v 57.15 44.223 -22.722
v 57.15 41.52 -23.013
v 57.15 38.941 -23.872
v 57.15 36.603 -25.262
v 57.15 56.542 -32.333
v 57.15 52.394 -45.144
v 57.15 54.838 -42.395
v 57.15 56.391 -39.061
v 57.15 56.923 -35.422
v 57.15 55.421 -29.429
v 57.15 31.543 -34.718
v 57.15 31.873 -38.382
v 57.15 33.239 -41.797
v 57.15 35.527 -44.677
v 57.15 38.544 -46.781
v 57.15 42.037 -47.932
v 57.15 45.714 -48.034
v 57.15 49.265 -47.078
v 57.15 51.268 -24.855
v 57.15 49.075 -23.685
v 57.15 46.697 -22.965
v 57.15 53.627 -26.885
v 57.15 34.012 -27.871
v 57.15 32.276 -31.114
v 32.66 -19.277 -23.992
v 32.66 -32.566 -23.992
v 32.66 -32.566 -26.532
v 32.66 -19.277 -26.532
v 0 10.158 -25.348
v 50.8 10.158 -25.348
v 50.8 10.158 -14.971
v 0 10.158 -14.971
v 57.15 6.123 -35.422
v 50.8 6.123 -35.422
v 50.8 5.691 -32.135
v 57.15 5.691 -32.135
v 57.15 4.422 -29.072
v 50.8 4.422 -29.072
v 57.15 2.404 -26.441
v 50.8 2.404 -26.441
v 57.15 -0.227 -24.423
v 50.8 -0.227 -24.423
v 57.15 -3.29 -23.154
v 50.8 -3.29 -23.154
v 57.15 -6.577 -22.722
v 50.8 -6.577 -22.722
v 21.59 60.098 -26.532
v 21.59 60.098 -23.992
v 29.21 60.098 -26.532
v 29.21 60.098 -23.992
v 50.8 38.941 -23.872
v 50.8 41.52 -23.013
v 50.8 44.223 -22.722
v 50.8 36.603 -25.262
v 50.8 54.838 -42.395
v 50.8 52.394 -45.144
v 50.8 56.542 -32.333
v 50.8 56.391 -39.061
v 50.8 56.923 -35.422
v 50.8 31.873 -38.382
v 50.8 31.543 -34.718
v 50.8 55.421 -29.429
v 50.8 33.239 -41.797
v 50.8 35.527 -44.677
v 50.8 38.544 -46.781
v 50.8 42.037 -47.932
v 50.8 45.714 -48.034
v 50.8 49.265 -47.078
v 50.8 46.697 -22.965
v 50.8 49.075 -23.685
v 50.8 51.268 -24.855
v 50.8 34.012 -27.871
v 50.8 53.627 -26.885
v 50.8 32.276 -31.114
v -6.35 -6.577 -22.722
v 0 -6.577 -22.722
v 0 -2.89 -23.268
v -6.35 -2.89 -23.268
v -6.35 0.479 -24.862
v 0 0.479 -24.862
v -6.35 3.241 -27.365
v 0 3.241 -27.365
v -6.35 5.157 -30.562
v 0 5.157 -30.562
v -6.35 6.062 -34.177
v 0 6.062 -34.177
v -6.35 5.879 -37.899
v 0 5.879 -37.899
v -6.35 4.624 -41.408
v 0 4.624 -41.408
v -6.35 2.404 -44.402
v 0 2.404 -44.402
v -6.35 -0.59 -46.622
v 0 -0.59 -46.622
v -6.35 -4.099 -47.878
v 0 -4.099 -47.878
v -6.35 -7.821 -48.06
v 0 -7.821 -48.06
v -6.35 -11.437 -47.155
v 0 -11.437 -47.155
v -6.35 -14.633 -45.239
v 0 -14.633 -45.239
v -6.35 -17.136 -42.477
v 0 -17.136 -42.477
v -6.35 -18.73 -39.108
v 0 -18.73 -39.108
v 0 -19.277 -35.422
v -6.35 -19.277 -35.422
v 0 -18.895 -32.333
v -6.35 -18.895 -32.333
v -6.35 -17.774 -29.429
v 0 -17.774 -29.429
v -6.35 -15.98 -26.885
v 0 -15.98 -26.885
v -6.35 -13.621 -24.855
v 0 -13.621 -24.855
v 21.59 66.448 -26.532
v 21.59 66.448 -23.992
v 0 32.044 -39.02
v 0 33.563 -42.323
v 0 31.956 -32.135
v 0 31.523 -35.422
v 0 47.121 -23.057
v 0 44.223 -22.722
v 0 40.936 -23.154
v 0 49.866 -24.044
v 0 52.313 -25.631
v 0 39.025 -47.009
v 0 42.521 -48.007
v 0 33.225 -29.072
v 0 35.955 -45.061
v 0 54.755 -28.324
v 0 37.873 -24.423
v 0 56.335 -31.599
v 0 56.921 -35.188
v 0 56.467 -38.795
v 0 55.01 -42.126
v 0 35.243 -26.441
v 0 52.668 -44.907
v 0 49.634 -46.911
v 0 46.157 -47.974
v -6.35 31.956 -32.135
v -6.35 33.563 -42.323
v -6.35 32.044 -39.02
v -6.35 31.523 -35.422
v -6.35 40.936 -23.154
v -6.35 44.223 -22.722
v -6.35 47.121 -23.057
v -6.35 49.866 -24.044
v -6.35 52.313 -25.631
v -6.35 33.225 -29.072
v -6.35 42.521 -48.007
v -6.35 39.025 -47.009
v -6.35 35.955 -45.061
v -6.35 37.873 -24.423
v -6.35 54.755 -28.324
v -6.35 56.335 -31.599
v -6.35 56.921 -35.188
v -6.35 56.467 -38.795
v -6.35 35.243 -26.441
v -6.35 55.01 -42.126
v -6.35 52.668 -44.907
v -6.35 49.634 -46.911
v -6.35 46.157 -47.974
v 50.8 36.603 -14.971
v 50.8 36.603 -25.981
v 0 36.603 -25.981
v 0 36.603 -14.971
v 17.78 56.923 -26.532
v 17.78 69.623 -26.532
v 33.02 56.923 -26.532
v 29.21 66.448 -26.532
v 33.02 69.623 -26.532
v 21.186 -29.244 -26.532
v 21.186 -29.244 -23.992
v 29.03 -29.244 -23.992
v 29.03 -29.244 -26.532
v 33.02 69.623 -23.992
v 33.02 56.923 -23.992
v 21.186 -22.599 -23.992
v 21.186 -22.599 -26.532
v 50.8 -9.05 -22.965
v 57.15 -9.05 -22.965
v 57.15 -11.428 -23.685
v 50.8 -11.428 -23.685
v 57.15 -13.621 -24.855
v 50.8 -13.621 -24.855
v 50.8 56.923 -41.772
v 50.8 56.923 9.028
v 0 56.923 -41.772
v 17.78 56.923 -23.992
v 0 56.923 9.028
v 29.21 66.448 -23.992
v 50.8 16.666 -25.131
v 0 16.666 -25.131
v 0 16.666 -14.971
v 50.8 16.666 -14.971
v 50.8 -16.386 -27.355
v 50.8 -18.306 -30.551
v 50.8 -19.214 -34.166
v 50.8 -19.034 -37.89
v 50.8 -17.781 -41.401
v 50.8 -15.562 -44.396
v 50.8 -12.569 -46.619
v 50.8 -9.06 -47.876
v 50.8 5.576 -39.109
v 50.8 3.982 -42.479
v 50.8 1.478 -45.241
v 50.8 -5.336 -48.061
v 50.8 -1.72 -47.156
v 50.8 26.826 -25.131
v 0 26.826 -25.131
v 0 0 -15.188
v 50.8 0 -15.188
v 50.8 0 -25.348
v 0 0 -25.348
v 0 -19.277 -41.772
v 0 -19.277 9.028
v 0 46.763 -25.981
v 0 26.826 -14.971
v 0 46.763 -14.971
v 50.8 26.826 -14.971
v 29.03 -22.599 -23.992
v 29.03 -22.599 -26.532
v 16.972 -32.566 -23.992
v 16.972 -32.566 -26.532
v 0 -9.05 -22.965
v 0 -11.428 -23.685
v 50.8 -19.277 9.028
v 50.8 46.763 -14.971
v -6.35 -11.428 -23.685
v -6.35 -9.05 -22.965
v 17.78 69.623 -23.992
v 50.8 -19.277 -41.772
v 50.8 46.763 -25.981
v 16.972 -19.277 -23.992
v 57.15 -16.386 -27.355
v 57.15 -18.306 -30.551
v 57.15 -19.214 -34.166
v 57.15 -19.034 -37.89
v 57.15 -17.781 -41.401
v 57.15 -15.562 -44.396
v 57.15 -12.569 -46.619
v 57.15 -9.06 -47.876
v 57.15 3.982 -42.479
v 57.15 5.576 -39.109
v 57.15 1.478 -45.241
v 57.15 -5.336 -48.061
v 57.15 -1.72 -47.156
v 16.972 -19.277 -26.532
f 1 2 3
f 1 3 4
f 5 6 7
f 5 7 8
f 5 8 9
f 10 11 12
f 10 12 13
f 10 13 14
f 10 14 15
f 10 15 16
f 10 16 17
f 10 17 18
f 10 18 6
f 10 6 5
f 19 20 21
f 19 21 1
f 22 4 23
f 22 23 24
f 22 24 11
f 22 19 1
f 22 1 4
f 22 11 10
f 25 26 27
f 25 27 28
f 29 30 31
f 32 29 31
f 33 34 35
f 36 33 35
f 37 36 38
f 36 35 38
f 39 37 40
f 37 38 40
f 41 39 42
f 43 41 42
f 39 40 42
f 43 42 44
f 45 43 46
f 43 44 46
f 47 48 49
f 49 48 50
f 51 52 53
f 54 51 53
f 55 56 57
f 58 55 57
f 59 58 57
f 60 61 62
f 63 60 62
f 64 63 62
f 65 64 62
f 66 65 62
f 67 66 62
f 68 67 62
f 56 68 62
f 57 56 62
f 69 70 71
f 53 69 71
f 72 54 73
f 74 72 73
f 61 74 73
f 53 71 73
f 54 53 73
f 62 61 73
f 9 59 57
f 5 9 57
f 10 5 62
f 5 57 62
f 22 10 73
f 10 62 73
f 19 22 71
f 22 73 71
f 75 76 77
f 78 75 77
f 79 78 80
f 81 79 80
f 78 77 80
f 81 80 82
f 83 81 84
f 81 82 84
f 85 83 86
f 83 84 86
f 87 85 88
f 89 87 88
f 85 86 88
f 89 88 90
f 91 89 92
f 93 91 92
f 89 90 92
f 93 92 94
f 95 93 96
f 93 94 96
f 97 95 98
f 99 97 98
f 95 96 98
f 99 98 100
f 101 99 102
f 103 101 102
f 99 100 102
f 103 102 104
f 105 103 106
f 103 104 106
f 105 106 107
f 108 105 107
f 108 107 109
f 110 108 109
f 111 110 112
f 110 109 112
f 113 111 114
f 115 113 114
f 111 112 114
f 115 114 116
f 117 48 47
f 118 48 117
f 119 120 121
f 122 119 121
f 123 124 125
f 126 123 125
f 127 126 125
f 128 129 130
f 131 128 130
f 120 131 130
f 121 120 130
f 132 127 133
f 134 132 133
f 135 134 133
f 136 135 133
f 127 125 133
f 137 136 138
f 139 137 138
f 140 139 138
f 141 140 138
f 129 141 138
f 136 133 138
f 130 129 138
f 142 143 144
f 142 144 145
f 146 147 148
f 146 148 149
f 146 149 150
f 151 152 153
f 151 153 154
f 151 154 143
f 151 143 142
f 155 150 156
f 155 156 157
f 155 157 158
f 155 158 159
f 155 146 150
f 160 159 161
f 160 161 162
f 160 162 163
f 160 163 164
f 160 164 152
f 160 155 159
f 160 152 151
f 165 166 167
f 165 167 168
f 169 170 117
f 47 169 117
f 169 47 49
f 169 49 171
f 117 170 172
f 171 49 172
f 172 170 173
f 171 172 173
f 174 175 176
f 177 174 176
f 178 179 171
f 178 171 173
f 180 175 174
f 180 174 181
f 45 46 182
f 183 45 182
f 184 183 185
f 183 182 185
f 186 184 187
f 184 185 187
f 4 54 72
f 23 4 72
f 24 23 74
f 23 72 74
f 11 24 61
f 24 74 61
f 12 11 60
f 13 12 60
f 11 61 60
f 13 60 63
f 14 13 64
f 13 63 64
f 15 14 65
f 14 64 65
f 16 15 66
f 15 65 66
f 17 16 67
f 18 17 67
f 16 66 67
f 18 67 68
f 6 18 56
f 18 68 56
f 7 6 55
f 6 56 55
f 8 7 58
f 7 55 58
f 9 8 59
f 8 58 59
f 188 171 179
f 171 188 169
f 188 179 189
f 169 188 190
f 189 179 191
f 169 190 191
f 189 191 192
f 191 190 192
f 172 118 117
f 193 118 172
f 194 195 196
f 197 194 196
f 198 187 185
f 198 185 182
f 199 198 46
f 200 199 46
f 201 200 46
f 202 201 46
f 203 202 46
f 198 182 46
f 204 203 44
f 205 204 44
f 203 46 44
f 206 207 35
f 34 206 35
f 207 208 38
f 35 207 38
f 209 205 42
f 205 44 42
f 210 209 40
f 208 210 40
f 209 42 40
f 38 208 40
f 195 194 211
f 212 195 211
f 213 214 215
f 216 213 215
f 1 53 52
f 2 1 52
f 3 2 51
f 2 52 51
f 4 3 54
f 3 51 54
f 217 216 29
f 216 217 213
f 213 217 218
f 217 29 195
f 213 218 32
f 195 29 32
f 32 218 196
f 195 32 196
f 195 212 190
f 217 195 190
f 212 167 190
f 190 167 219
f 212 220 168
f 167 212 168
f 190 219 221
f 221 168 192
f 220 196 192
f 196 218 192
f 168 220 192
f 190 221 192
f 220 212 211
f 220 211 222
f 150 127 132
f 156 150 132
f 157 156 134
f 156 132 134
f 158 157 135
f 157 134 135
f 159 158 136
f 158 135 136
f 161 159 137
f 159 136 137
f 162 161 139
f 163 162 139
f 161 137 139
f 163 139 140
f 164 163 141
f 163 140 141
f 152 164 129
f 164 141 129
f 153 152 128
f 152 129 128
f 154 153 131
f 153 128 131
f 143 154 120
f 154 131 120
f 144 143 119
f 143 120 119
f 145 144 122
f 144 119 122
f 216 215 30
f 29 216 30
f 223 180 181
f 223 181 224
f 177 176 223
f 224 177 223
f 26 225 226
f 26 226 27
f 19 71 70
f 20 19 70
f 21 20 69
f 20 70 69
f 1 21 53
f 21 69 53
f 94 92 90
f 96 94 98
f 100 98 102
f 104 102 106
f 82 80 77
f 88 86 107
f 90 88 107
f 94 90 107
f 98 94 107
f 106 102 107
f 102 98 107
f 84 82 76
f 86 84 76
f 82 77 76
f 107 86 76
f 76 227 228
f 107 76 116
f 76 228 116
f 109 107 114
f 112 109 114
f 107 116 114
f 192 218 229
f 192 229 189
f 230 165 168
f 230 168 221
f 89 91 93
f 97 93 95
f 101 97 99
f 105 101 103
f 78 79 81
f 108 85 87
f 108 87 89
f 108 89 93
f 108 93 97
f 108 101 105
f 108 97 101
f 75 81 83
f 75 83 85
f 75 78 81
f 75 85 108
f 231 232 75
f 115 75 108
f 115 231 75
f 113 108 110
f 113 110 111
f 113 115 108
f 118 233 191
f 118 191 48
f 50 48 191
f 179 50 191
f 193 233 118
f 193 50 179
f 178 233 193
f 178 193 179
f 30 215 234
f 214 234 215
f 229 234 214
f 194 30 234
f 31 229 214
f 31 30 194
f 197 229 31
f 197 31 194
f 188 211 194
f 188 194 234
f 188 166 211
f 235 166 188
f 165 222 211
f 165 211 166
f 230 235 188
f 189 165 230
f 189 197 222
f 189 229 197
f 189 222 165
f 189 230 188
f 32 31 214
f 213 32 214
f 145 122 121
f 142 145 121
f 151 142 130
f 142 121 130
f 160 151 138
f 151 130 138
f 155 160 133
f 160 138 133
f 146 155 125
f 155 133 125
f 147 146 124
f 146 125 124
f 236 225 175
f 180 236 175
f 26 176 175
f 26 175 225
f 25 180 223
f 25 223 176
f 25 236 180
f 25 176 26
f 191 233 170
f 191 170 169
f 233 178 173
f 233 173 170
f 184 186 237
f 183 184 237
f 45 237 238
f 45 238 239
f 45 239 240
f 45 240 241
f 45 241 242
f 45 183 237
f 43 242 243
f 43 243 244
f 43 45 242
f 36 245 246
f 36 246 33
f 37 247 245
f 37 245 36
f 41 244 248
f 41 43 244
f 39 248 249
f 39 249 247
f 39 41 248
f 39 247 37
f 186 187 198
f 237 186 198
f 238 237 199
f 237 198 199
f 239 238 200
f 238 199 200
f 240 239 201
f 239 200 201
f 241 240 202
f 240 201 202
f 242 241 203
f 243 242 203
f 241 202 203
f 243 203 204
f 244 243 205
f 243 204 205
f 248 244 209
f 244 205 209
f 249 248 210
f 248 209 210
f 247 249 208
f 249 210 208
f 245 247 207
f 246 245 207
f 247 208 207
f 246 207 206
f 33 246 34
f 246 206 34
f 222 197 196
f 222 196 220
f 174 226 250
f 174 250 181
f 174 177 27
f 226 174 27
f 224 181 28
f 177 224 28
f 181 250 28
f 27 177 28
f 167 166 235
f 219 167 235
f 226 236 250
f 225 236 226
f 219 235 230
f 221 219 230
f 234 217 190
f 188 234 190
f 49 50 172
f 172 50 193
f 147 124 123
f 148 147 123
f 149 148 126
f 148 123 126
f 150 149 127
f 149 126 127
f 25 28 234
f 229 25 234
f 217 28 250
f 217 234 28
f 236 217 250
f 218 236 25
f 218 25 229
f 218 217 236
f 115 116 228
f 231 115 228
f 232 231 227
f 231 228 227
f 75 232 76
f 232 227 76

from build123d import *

# Parameters (mm, degrees)
F0_W      = 76.2
F0_H      = 50.8
F1_DEPTH  = 50.8
F2_W      = 10.16
F2_H      = 10.16
F2_H_2    = 11.009983
F3_DEPTH  = 50.8
F5_DEPTH  = 6.35
F7_DEPTH  = 6.35
F8_W      = 7.62
F8_H      = 6.35
F8_W_2    = 7.844116
F8_H_2    = 6.644809
F9_DEPTH  = 35.56
F10_DEPTH = 33.02


with BuildPart() as f1:
    # F0 (on Right) → F1 (new body)
    with BuildSketch(Plane.YZ):
        with Locations((18.823405, -16.371597)):
            Rectangle(F0_W, F0_H)
    extrude(amount=F1_DEPTH)

    # F2 (on face) → F3 (cut)
    with BuildSketch(Plane.YZ.offset(50.8)):
        Polygon((10.157681, -14.971033), (0, -15.188088), (0, -25.348088), (10.157681, -25.348088), align=None)
        with Locations((21.746397, -20.051033)):
            Rectangle(F2_W, F2_H)
        with Locations((41.683405, -20.476025)):
            Rectangle(F2_W, F2_H_2)
    extrude(amount=-F3_DEPTH, mode=Mode.SUBTRACT)

    # F8 (on face) → F9 (join)
    with BuildSketch(Plane.XY.offset(9.028403)):
        Polygon((17.78, 56.923405), (25.4, 56.923405), (33.02, 56.923405), (33.02, 69.623405), (17.78, 69.623405), (17.78, 63.273405), align=None)
        with Locations((25.4, 63.273405)):
            Rectangle(F8_W, F8_H, mode=Mode.SUBTRACT)
        Polygon((32.660052, -19.276595), (25.4, -19.276595), (16.971819, -19.276595), (16.971819, -32.566212), (32.660052, -32.566212), (32.660052, -25.921404), align=None)
        with Locations((25.107968, -25.921403)):
            Rectangle(F8_W_2, F8_H_2, mode=Mode.SUBTRACT)
    extrude(amount=-F9_DEPTH)

    # F8 (on face) → F10 (cut)
    with BuildSketch(Plane.XY.offset(9.028403)):
        Polygon((17.78, 56.923405), (25.4, 56.923405), (33.02, 56.923405), (33.02, 69.623405), (17.78, 69.623405), (17.78, 63.273405), align=None)
        with Locations((25.4, 63.273405)):
            Rectangle(F8_W, F8_H, mode=Mode.SUBTRACT)
        Polygon((32.660052, -19.276595), (25.4, -19.276595), (16.971819, -19.276595), (16.971819, -32.566212), (32.660052, -32.566212), (32.660052, -25.921404), align=None)
        with Locations((25.107968, -25.921403)):
            Rectangle(F8_W_2, F8_H_2, mode=Mode.SUBTRACT)
    extrude(amount=-F10_DEPTH, mode=Mode.SUBTRACT)


with BuildPart() as f5:
    # F4 (on face) → F5 (new body)
    with BuildSketch(Plane(origin=(0, 0, 0), x_dir=(0, -1, 0), z_dir=(-1, 0, 0))):
        with BuildLine():
            ThreePointArc((-52.312775, -25.631189), (-49.634273, -46.911266), (-31.523405, -35.421597))
            ThreePointArc((-31.523405, -35.421597), (-35.243149, -26.441341), (-44.223405, -22.721597))
            Line((-44.223405, -22.721597), (-44.223405, -35.421597))
            Line((-44.223405, -35.421597), (-52.312775, -25.631189))
        make_face()
        with BuildLine():
            Line((-44.223405, -35.421597), (-44.223405, -22.721597))
            ThreePointArc((-44.223405, -22.721597), (-48.521766, -23.471112), (-52.312775, -25.631189))
            Line((-52.312775, -25.631189), (-44.223405, -35.421597))
        make_face()
        with BuildLine():
            ThreePointArc((6.576595, -22.721597), (-2.403661, -44.401853), (19.276595, -35.421597))
            ThreePointArc((19.276595, -35.421597), (17.773863, -29.429001), (13.621288, -24.854558))
            Line((13.621288, -24.854558), (6.576595, -35.421597))
            Line((6.576595, -35.421597), (6.576595, -22.721597))
        make_face()
        with BuildLine():
            Line((6.576595, -35.421597), (13.621288, -24.854558))
            ThreePointArc((13.621288, -24.854558), (10.256854, -23.266528), (6.576595, -22.721597))
            Line((6.576595, -22.721597), (6.576595, -35.421597))
        make_face()
    extrude(amount=F5_DEPTH)


with BuildPart() as f7:
    # F6 (on face) → F7 (new body)
    with BuildSketch(Plane.YZ.offset(50.8)):
        with BuildLine():
            ThreePointArc((-13.621288, -24.854558), (-12.569191, -46.618864), (6.123405, -35.421597))
            ThreePointArc((6.123405, -35.421597), (2.403661, -26.441341), (-6.576595, -22.721597))
            Line((-6.576595, -22.721597), (-6.576595, -35.421597))
            Line((-6.576595, -35.421597), (-13.621288, -24.854558))
        make_face()
        with BuildLine():
            Line((-6.576595, -35.421597), (-6.576595, -22.721597))
            ThreePointArc((-6.576595, -22.721597), (-10.256854, -23.266528), (-13.621288, -24.854558))
            Line((-13.621288, -24.854558), (-6.576595, -35.421597))
        make_face()
        with BuildLine():
            ThreePointArc((44.223405, -22.721597), (40.207312, -23.373319), (36.603405, -25.261597))
            ThreePointArc((36.603405, -25.261597), (38.543792, -46.780822), (56.923405, -35.421597))
            ThreePointArc((56.923405, -35.421597), (55.420672, -29.429001), (51.268097, -24.854558))
            Line((51.268097, -24.854558), (44.223405, -35.421597))
            Line((44.223405, -35.421597), (44.223405, -22.721597))
        make_face()
        with BuildLine():
            ThreePointArc((51.268097, -24.854558), (47.903663, -23.266528), (44.223405, -22.721597))
            Line((44.223405, -22.721597), (44.223405, -35.421597))
            Line((44.223405, -35.421597), (51.268097, -24.854558))
        make_face()
    extrude(amount=F7_DEPTH)


solid = Compound([f1.part, f5.part, f7.part])
